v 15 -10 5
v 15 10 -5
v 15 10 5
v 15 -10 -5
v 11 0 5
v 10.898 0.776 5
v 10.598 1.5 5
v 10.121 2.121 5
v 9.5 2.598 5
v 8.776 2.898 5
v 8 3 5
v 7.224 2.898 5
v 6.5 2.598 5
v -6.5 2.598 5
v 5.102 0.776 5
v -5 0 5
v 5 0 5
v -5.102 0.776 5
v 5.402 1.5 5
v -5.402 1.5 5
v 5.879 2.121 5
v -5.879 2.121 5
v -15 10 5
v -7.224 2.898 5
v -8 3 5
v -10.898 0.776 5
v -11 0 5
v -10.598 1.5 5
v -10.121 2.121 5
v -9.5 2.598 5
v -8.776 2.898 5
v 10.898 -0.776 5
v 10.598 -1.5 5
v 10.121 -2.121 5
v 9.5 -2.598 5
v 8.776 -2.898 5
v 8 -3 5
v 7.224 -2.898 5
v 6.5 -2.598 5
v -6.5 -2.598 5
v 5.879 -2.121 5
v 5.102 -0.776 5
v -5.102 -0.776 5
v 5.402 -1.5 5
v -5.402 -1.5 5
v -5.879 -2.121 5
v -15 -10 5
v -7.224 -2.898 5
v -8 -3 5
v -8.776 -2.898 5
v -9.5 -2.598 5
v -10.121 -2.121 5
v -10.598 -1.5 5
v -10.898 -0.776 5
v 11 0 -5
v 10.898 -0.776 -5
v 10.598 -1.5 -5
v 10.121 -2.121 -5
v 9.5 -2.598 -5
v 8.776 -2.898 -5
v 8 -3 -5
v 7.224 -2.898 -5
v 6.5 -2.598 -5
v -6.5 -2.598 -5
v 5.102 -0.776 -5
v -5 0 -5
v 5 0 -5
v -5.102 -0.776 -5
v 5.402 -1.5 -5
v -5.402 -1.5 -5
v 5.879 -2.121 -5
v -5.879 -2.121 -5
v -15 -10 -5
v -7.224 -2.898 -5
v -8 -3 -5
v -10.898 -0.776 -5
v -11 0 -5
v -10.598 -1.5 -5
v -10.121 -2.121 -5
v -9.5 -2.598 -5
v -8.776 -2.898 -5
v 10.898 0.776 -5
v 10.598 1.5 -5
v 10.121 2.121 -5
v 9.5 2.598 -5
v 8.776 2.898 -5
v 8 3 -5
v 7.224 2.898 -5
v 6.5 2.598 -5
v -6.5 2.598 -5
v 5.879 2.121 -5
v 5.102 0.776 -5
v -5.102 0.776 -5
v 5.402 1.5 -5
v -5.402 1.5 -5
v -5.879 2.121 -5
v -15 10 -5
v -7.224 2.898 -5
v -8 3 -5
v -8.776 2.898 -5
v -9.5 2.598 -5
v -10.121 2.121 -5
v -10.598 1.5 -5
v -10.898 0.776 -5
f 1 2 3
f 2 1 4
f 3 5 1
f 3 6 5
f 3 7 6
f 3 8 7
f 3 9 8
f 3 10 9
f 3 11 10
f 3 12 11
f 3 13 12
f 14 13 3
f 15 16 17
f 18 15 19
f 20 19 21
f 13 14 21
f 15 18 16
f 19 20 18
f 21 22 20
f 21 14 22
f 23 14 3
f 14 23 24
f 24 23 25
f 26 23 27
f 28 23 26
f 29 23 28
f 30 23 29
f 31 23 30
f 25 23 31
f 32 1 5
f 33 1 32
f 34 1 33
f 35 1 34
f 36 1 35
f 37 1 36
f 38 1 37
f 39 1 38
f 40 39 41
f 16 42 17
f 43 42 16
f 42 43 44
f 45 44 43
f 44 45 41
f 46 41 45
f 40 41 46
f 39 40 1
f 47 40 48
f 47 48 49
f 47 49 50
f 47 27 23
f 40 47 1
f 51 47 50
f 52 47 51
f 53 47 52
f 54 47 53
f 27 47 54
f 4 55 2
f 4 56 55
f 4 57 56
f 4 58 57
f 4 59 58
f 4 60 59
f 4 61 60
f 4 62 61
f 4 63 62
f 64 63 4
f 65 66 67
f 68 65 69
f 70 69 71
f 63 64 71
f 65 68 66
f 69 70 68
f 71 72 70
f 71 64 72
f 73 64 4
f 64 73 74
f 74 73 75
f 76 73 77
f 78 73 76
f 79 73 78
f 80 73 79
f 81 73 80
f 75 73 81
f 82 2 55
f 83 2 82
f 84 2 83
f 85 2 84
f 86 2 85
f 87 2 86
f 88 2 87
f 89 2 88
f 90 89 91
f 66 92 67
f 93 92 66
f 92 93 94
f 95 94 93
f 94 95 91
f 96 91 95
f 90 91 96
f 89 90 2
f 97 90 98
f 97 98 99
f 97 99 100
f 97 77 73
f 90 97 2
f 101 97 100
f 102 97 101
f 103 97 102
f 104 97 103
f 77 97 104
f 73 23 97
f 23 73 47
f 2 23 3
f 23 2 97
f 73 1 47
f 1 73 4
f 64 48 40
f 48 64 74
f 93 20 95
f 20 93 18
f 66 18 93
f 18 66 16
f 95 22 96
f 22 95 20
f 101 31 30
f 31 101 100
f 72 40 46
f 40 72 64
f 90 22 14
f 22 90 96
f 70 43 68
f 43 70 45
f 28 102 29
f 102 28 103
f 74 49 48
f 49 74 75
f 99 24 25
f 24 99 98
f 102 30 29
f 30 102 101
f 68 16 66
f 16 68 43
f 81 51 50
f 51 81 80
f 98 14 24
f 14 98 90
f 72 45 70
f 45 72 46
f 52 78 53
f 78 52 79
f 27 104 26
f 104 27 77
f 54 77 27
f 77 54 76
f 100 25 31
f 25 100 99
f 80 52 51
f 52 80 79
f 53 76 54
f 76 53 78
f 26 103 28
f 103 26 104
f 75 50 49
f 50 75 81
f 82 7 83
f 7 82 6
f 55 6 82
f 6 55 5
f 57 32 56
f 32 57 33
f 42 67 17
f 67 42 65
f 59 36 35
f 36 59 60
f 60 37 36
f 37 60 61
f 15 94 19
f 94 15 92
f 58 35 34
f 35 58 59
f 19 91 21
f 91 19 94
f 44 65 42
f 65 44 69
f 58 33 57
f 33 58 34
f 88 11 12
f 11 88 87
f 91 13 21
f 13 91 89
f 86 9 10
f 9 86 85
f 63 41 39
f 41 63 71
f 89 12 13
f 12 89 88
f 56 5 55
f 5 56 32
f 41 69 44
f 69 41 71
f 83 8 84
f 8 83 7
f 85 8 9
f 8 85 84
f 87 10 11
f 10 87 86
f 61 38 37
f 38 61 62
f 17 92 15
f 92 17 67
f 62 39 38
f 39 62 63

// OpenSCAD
// difference(a, b, c) == difference(a, union(b, c)); both sides must agree
difference() {
  cube([30, 20, 10], center = true);
  translate([-8, 0, 0]) cylinder(h = 30, r = 3, center = true, $fn = 24);
  translate([8, 0, 0]) cylinder(h = 30, r = 3, center = true, $fn = 24);
}
